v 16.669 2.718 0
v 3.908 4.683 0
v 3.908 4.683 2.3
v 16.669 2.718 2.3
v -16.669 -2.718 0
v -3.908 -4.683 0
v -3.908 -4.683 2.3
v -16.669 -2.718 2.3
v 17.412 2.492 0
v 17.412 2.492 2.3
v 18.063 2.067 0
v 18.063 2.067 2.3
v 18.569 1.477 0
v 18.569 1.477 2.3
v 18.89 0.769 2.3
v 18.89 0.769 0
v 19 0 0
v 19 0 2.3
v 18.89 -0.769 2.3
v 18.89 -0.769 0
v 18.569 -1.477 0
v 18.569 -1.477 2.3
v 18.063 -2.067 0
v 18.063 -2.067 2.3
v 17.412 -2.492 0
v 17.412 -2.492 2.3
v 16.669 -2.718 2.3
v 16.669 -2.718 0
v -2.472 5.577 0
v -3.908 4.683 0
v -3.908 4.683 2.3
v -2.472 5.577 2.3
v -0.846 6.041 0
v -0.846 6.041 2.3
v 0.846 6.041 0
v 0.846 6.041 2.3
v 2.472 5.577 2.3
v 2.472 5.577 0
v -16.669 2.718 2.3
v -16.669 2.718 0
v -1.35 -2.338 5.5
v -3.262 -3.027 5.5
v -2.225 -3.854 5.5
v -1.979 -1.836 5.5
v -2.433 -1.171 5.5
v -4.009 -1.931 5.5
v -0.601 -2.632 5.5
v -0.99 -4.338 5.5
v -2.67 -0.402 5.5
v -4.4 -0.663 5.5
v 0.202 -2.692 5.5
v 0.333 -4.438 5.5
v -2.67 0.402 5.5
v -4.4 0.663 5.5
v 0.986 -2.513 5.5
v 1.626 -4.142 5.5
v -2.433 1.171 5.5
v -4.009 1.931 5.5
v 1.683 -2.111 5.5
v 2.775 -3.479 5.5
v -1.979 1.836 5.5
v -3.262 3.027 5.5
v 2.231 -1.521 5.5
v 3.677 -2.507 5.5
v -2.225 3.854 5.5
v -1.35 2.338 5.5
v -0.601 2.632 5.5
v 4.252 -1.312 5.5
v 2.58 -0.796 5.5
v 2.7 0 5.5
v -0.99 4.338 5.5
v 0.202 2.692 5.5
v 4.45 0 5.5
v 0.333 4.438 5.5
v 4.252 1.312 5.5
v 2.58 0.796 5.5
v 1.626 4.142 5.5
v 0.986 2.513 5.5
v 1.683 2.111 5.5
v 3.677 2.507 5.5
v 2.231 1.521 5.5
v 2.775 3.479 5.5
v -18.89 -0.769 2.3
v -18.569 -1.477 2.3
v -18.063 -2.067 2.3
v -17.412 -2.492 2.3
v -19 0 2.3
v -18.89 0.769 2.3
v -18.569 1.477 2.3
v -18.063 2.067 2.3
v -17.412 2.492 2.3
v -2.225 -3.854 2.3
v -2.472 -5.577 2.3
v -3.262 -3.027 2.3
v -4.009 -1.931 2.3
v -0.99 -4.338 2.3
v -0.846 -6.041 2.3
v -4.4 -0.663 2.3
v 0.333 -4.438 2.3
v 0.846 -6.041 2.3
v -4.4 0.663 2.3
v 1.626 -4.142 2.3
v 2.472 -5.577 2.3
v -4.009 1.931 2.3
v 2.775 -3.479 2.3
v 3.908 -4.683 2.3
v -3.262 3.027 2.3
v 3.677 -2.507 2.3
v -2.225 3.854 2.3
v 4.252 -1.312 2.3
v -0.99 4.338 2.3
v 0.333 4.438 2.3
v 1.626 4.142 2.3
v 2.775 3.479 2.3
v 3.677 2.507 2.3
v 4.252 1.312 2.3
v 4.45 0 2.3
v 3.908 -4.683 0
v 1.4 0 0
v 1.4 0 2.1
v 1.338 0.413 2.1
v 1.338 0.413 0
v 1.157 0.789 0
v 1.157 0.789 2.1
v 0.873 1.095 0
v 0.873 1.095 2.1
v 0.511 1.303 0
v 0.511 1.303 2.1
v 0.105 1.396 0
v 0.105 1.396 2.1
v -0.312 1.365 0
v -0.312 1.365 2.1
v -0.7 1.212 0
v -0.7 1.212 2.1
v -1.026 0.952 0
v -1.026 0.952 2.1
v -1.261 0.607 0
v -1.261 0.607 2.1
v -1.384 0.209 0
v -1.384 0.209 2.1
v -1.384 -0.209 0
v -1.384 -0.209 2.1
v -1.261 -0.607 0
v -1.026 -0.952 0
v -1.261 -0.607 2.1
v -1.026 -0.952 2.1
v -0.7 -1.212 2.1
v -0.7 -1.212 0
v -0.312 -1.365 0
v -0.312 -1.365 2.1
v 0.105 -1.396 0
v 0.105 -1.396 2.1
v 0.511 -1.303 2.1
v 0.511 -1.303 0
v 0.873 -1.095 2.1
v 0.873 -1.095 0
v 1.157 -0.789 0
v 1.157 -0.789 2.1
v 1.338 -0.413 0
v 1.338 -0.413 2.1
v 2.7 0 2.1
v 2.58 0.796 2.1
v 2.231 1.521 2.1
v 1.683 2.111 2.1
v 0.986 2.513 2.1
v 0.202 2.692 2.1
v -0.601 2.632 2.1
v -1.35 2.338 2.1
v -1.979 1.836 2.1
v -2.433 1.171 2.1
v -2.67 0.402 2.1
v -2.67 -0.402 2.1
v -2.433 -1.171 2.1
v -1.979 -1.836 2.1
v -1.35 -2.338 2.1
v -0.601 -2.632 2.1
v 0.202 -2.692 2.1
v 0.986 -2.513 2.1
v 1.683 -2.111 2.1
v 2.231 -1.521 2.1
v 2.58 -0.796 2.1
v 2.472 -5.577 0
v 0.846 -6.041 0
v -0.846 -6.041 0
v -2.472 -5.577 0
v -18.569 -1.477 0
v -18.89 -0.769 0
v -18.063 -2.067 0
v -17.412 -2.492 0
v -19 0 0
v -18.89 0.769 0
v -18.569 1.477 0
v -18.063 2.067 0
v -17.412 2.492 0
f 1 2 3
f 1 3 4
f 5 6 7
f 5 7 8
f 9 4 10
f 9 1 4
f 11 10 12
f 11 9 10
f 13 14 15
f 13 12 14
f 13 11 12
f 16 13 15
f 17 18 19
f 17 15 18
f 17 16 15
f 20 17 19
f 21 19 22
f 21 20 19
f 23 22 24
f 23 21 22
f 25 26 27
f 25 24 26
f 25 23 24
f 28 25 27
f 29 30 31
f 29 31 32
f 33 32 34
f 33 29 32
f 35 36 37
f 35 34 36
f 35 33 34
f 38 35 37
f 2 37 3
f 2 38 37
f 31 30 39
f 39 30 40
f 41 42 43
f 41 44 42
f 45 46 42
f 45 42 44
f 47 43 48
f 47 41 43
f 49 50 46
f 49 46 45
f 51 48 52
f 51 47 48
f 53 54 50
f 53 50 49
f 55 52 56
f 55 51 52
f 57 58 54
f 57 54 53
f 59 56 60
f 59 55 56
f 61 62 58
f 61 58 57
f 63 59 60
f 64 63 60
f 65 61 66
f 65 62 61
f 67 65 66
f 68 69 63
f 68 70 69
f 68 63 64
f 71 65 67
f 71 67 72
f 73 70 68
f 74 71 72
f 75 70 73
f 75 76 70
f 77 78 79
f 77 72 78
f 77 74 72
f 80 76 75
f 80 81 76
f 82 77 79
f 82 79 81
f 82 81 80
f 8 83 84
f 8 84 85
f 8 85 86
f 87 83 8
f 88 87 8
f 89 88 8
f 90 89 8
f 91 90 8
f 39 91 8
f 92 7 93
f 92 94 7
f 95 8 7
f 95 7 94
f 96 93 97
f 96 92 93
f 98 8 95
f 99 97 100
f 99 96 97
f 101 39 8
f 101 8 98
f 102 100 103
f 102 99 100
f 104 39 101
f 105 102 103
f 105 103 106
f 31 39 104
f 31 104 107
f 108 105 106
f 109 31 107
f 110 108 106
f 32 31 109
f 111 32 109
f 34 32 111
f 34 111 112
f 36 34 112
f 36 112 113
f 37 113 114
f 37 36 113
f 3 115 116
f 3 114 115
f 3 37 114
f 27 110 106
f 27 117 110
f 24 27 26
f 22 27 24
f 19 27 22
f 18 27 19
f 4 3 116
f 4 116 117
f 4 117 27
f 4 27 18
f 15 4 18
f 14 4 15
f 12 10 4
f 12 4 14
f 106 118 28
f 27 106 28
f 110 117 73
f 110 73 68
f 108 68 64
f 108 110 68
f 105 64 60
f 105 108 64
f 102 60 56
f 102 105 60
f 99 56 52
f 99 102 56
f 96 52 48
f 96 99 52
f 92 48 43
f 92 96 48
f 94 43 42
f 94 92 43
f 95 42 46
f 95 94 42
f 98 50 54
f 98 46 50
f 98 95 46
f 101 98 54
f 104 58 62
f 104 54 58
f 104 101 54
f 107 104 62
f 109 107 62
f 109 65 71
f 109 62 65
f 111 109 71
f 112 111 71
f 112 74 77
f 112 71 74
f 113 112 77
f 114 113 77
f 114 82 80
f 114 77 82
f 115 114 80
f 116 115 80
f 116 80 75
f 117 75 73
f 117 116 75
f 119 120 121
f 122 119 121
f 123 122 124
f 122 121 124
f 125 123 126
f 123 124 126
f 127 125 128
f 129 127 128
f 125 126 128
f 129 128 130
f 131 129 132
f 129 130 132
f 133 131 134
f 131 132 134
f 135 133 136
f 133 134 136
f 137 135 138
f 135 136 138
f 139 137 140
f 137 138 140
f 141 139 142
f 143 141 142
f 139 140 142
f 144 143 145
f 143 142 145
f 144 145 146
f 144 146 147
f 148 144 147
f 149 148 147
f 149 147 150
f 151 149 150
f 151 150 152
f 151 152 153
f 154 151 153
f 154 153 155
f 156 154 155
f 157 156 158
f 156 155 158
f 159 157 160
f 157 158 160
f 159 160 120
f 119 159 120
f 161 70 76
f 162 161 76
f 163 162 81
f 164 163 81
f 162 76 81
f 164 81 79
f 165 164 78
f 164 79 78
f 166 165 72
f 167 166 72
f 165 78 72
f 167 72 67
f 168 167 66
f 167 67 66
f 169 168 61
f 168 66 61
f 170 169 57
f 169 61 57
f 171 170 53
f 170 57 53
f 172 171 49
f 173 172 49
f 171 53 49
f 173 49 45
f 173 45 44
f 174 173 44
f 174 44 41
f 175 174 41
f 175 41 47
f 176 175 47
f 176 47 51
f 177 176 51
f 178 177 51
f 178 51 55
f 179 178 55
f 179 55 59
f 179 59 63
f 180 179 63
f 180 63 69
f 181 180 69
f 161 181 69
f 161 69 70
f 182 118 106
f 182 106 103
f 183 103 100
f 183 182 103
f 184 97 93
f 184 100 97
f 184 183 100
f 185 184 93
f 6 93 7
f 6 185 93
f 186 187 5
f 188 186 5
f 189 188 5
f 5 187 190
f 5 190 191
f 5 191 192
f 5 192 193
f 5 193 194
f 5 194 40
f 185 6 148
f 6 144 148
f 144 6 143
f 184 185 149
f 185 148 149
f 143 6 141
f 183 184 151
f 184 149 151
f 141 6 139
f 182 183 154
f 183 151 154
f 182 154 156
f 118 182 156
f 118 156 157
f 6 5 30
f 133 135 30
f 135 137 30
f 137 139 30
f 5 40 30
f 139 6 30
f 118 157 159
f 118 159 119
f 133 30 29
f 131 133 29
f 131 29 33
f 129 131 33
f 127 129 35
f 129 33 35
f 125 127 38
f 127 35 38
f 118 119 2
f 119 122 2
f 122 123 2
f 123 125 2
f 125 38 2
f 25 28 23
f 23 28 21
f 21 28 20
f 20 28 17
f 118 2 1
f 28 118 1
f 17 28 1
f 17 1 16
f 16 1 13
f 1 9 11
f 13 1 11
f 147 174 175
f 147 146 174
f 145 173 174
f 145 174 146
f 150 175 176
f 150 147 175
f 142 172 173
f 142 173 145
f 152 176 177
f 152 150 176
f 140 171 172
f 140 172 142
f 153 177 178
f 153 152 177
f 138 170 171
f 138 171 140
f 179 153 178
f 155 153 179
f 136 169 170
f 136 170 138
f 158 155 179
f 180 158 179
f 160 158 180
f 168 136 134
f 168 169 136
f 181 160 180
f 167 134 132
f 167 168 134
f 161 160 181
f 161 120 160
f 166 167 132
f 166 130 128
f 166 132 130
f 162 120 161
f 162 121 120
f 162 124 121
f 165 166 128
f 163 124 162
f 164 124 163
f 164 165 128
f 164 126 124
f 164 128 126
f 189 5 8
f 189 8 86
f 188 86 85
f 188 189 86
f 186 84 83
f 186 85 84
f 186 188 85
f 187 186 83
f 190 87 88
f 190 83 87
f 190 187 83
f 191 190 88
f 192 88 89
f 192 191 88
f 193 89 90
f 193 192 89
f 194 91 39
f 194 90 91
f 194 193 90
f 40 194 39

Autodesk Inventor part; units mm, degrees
ref_plane "YZ Plane" through (0, 0, 0) normal (1, 0, 0) x (0, 1, 0)
ref_plane "XY Plane" through (0, 0, 0) normal (0, 0, 1) x (1, 0, 0)
sketch "Sketch1" plane through (0, 0, 0) normal (0, 0, 1) x (1, 0, 0)
  arc A0 (-16.6686, 2.7179) -> (-16.6686, -2.7179) centre (-16.25, 0) ccw
  arc A1 (16.6686, -2.7179) -> (16.6686, 2.7179) centre (16.25, 0) ccw
  line L0 (-3.9085, 4.6833) -> (-16.6686, 2.7179)
  line L1 (-3.9085, -4.6833) -> (-16.6686, -2.7179)
  line L2 (3.9085, -4.6833) -> (16.6686, -2.7179)
  line L3 (3.9085, 4.6833) -> (16.6686, 2.7179)
  arc A2 (-3.9085, -4.6833) -> (3.9085, -4.6833) centre (0, 0) ccw
  arc A3 (3.9085, 4.6833) -> (-3.9085, 4.6833) centre (0, 0) ccw
  point P0 (0, 4.6833)
  dimension "d2" = 5.5
  dimension "d3" = 5.5
extrude "Extrusion1" add sketch "Sketch1" along normal blind 2.3
sketch "Sketch2" plane through (0, 0, 2.3) normal (0, 0, 1) x (1, 0, 0)
  arc A0 (-3.9085, -4.6833) -> (3.9085, -4.6833) centre (0, 0) ccw projected
  circle A1 centre (0, 0) radius 4.45
  dimension "d6" = 8.9
extrude "Extrusion2" add sketch "Sketch2" along normal blind 3.2
sketch "Sketch3" plane through (0, 0, 5.5) normal (0, 0, 1) x (1, 0, 0)
  circle A0 centre (0, 0) radius 4.45 projected
  circle A1 centre (0, 0) radius 2.7
  dimension "d9" = 5.4
extrude "Extrusion3" cut sketch "Sketch3" against normal blind 3.4 contours A1
sketch "Sketch4" plane through (0, 0, 2.1) normal (0, 0, 1) x (1, 0, 0)
  circle A0 centre (0, 0) radius 2.7 projected
  circle A1 centre (0, 0) radius 1.4
  dimension "d12" = 2.8
extrude "Extrusion4" cut sketch "Sketch4" against normal blind 3.4 contours A1
ref_plane "ConstraintPlane" through (0, 0, 0) normal (0, 1, 0) x (-1, 0, 0)
properties part number "MG996RHorn"
